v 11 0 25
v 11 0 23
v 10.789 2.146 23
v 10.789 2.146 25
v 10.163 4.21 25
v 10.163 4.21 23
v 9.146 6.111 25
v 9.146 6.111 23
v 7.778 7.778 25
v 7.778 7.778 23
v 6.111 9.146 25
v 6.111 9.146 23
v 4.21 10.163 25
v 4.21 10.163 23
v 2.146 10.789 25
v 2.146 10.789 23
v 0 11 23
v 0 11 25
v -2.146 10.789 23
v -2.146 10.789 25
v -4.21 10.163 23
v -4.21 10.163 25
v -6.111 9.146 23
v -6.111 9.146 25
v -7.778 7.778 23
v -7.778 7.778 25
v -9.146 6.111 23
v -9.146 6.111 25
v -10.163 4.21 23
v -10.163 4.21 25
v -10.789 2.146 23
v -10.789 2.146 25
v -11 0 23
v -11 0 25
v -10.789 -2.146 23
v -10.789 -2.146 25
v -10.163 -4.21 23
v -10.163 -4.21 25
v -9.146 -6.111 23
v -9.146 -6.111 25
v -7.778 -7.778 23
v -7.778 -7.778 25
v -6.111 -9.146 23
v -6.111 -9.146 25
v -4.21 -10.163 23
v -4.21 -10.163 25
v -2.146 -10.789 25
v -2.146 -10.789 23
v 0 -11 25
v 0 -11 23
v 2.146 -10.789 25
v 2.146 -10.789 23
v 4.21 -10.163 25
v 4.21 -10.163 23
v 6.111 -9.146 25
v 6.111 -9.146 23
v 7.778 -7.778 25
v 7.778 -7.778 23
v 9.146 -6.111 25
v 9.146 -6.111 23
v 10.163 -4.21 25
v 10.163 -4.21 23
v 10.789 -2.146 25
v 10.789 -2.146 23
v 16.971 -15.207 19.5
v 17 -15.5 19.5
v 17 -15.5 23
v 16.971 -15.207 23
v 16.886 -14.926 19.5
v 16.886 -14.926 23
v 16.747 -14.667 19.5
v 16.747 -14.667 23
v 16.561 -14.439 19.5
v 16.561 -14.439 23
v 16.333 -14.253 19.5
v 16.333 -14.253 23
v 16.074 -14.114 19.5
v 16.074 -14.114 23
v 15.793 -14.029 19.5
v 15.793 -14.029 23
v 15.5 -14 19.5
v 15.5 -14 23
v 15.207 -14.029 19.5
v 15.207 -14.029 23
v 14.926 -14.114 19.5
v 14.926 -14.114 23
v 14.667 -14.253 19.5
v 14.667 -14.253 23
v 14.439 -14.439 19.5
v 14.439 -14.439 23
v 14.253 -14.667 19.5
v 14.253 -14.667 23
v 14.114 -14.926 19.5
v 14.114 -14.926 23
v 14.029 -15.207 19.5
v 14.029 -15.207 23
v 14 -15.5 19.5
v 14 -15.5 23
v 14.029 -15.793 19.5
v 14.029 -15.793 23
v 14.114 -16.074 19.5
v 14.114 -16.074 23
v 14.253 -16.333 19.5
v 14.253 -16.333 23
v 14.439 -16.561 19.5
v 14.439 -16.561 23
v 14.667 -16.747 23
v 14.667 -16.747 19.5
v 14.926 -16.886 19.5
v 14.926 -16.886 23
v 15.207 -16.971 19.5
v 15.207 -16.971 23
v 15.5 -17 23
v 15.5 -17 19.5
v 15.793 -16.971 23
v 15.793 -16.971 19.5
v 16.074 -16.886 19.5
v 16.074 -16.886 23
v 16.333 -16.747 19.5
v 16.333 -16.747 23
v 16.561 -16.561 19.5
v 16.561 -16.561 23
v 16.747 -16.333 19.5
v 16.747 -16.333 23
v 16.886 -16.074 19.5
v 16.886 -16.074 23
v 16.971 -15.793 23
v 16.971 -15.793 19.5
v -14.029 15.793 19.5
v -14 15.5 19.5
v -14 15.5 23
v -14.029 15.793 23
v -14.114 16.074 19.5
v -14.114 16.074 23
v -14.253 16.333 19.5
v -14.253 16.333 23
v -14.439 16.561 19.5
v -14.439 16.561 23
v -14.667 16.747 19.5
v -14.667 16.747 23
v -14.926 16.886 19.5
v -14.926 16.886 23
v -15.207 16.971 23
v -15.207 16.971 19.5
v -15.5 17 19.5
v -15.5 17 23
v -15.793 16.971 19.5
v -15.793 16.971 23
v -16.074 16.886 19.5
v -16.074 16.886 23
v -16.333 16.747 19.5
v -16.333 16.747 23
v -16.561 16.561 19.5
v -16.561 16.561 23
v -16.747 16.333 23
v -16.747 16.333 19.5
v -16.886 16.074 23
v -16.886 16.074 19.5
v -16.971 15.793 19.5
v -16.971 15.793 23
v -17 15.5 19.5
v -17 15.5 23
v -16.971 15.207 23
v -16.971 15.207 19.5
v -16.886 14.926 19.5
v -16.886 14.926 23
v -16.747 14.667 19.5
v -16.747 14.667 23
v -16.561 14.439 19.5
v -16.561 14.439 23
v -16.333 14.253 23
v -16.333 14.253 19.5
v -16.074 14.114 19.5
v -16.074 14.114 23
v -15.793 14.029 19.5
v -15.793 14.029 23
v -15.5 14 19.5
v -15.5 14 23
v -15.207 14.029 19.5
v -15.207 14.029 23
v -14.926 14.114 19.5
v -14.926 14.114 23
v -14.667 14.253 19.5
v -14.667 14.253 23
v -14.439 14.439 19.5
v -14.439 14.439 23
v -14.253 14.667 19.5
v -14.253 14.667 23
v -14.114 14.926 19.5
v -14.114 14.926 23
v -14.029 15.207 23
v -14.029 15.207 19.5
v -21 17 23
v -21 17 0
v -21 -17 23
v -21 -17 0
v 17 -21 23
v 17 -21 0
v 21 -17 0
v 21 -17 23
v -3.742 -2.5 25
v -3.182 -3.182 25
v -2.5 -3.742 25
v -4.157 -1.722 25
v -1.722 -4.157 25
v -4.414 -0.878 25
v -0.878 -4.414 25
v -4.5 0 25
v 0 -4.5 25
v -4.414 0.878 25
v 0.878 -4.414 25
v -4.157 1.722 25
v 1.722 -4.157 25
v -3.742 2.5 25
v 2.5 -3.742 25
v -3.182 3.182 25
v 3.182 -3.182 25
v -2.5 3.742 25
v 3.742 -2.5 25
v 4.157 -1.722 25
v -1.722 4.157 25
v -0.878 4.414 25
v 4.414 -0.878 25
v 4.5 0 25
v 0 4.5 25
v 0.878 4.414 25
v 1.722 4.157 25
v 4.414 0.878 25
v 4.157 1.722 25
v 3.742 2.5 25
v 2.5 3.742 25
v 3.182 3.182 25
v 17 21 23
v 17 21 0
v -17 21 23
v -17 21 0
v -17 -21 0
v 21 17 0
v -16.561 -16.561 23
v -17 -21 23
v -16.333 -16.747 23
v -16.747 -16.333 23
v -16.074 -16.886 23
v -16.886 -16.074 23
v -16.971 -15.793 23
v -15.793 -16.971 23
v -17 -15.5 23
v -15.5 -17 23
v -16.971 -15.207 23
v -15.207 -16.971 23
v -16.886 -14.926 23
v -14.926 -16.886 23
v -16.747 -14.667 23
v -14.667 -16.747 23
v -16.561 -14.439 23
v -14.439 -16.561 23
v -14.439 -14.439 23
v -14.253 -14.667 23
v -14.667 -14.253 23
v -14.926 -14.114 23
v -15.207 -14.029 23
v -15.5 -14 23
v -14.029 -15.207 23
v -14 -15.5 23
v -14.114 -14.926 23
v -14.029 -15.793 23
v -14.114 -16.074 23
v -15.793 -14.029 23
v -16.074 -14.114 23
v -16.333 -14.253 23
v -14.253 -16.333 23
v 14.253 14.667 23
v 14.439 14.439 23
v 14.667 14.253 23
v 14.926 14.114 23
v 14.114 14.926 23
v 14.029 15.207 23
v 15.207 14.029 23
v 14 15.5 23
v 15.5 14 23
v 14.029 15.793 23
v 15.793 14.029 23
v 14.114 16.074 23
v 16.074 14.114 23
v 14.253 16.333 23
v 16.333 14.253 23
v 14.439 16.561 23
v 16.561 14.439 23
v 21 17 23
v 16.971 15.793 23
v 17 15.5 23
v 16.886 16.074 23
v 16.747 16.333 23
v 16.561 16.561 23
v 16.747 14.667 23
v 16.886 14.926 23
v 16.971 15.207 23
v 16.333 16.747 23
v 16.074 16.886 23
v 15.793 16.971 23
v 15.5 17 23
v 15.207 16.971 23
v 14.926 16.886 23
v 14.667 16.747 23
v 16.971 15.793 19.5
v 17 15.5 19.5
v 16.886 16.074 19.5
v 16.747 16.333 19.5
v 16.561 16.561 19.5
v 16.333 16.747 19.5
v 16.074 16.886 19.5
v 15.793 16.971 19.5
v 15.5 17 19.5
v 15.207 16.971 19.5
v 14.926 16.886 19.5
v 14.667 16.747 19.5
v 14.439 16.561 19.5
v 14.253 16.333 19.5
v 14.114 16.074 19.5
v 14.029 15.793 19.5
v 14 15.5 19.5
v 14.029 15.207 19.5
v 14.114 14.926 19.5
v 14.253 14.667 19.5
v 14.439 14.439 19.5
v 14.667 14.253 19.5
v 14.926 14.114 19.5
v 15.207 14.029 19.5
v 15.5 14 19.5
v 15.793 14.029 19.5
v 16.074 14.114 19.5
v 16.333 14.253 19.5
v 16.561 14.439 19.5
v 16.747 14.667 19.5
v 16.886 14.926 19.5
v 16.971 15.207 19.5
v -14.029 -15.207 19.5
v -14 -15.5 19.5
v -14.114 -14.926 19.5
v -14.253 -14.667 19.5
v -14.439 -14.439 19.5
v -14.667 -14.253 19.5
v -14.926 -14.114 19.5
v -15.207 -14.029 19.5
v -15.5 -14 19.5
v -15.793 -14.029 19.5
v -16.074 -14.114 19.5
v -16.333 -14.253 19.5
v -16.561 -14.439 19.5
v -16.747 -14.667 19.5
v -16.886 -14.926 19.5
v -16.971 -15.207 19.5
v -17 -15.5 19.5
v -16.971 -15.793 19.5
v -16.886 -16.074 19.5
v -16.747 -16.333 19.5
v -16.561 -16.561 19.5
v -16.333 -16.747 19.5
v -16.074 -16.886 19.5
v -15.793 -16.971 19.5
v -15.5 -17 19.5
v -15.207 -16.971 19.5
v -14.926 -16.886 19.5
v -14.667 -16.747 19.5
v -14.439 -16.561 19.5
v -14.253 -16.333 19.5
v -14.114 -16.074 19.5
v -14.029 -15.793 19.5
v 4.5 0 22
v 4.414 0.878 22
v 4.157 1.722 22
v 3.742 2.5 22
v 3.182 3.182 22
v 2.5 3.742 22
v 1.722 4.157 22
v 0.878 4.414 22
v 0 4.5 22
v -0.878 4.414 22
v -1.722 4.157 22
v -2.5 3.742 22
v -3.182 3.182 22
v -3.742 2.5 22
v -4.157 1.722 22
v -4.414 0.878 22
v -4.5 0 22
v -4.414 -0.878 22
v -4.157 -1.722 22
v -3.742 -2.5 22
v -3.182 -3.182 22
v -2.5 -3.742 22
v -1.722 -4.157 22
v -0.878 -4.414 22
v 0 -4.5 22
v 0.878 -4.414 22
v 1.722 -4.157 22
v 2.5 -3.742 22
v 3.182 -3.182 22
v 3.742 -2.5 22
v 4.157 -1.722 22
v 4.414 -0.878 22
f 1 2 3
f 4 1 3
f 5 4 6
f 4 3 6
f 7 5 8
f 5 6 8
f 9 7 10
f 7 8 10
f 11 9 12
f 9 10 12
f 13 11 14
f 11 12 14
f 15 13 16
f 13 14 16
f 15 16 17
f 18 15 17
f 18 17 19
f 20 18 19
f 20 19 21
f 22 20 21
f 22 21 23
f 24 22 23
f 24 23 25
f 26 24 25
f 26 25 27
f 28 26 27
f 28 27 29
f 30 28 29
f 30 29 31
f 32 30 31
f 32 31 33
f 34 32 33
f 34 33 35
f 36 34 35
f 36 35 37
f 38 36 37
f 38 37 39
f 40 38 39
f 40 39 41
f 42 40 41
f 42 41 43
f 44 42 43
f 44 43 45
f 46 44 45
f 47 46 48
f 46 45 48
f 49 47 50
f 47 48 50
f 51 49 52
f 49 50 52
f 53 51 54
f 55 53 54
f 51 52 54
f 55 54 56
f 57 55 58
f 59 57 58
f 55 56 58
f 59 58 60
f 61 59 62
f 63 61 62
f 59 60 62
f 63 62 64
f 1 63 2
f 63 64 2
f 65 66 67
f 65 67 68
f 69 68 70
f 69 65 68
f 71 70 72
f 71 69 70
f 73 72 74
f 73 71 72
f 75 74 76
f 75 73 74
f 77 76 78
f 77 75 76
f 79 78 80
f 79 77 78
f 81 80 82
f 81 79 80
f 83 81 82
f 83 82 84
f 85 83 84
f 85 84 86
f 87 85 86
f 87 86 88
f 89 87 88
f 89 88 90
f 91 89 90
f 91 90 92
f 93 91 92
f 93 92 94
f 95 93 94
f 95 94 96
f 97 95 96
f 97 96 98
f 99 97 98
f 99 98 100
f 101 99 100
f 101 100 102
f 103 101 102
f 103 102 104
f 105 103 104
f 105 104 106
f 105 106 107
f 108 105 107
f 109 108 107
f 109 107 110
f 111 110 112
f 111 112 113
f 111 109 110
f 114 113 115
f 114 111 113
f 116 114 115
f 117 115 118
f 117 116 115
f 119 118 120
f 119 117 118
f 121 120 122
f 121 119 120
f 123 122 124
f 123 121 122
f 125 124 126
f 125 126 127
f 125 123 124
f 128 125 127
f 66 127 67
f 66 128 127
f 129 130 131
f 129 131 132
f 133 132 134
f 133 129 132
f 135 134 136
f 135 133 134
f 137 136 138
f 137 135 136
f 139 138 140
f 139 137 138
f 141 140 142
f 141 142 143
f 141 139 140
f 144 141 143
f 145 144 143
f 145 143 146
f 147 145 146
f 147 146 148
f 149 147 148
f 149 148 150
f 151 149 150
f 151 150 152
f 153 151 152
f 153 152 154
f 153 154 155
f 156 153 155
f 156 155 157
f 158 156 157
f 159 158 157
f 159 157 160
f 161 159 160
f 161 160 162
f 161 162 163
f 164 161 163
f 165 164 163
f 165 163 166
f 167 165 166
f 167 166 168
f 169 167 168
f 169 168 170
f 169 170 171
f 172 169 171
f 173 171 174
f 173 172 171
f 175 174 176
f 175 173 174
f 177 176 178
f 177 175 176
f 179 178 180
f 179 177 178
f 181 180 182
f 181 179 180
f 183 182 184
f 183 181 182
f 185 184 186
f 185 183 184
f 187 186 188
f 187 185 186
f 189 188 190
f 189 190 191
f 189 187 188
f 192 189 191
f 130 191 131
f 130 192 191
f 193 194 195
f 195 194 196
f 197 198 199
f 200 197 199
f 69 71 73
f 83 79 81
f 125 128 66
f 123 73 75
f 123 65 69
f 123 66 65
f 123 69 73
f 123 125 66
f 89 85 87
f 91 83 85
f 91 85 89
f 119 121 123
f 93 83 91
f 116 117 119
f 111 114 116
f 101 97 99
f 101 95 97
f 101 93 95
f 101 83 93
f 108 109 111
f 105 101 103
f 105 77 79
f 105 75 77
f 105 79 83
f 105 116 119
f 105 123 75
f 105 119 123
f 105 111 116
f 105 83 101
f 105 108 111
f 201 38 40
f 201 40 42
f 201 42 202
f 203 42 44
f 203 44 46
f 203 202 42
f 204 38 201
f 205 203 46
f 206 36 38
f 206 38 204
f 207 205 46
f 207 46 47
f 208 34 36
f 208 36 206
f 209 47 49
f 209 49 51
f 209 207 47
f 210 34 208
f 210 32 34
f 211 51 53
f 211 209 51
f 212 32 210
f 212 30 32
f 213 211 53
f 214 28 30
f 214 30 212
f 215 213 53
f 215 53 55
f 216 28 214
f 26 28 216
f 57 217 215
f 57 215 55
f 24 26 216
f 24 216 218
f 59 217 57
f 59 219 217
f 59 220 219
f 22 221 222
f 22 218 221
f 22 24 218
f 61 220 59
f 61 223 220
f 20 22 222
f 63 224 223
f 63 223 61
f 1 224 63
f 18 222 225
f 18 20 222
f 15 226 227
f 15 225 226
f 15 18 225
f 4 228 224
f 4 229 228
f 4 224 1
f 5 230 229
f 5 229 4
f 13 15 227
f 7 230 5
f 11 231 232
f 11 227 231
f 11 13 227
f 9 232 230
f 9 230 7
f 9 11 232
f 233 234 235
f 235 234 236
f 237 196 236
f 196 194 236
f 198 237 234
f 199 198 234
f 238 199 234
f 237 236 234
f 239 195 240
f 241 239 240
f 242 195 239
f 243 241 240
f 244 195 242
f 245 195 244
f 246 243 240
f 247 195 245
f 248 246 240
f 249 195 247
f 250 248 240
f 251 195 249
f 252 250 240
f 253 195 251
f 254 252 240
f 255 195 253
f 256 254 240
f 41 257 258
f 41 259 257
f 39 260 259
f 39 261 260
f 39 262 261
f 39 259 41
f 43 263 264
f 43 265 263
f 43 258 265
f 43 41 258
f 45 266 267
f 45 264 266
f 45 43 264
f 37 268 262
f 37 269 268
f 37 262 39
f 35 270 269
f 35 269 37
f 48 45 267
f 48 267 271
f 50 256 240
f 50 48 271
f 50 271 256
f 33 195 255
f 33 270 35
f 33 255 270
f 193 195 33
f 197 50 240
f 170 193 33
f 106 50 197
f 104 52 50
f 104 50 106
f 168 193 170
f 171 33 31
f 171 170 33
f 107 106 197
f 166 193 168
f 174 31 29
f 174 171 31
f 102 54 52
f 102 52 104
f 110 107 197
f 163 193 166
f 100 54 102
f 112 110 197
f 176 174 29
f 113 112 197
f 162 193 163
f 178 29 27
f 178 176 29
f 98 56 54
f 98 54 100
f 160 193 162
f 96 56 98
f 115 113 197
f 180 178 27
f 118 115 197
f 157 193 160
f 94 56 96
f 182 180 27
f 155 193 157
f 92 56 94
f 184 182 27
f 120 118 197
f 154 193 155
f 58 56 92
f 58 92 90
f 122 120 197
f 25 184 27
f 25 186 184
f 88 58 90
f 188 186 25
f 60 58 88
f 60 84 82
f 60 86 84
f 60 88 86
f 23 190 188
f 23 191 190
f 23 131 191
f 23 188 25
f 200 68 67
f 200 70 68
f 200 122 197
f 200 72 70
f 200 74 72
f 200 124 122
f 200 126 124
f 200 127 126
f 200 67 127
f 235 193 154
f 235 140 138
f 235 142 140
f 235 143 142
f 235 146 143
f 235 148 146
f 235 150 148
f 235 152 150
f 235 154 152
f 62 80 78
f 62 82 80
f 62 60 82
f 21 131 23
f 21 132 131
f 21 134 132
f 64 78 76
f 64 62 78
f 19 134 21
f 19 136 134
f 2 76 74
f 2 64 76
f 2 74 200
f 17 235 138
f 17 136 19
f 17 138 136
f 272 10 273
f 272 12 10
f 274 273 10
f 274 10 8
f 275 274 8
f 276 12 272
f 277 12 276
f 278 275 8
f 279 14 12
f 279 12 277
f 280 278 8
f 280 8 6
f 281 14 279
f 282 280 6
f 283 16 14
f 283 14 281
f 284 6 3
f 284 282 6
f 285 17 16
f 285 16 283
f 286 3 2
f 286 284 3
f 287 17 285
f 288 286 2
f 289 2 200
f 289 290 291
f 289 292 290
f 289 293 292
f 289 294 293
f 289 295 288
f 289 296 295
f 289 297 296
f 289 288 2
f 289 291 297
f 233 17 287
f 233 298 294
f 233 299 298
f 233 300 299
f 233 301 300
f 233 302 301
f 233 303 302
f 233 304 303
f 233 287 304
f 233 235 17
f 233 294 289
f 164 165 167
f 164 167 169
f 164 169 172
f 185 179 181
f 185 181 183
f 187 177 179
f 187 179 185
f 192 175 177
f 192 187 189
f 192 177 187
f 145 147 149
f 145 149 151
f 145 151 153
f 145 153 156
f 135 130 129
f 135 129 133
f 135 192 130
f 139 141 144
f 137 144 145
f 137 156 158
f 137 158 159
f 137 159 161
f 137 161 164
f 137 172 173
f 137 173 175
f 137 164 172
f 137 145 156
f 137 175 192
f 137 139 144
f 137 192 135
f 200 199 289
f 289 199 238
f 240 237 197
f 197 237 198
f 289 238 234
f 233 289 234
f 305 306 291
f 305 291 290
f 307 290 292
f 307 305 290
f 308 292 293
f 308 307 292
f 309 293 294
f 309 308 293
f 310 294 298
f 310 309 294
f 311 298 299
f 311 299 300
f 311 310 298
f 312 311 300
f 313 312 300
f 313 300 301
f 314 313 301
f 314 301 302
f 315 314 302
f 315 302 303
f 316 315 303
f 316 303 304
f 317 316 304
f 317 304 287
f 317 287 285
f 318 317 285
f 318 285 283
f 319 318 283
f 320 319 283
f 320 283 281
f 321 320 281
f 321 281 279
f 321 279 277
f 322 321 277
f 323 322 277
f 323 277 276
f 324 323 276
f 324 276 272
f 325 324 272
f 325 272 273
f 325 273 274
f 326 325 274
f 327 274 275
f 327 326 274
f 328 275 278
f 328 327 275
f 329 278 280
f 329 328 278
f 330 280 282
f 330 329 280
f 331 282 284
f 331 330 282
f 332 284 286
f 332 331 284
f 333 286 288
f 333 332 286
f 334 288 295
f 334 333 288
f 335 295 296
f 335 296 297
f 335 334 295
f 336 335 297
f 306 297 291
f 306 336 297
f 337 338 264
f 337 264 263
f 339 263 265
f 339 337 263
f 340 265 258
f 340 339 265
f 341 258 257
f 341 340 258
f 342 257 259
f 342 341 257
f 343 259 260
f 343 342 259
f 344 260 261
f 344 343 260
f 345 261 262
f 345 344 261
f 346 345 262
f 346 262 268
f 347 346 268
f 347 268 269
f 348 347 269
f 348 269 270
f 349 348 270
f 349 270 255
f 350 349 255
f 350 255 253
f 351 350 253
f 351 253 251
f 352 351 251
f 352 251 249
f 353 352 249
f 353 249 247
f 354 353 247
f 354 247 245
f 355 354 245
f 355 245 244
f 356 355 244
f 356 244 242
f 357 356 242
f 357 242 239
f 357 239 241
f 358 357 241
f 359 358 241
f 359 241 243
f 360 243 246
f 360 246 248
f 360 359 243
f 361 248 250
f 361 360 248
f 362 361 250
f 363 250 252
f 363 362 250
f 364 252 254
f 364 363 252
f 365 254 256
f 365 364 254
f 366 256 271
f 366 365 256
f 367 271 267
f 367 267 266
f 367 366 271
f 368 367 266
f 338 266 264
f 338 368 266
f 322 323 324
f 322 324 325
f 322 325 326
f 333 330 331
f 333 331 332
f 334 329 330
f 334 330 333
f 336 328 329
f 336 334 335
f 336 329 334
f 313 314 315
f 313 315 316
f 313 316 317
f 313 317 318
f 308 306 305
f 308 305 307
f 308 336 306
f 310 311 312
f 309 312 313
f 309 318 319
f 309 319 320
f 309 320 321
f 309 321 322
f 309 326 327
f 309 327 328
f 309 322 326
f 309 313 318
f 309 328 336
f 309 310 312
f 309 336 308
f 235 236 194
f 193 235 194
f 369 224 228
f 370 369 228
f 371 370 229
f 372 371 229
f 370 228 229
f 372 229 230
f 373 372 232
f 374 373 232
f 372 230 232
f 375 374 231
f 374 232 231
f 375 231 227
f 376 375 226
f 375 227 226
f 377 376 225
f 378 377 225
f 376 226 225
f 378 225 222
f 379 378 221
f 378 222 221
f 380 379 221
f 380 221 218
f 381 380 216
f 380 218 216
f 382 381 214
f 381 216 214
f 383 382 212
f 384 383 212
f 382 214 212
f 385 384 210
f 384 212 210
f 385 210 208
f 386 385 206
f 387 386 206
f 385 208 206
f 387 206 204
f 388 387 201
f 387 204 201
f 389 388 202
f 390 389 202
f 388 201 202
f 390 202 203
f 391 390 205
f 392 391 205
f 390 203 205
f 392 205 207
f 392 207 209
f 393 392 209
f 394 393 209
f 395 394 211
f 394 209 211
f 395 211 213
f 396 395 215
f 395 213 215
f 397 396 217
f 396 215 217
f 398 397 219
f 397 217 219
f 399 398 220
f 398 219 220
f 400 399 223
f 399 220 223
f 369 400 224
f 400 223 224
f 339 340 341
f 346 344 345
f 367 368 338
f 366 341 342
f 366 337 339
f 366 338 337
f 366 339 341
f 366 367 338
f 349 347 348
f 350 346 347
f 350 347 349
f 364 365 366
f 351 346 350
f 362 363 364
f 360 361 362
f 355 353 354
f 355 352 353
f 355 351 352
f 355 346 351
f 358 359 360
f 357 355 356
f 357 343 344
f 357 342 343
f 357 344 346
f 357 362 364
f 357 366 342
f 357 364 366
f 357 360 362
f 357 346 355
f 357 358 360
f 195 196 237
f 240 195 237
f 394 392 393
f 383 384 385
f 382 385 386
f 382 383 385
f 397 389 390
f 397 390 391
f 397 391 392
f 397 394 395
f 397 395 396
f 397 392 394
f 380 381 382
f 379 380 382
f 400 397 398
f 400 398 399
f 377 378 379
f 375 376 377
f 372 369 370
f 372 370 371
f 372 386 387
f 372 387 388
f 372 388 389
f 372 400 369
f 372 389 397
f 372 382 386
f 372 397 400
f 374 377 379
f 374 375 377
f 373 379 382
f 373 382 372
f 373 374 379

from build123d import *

# Parameters (mm, degrees)
SKETCH_1_R          = 1.5
EXTRUDE_1_DEPTH     = 23
SKETCH_1_3_R        = 1.5
EXTRUDE_2_DEPTH     = 19.5
SKETCH_1_6_R        = 11
EXTRUDE_4_DEPTH     = 25
SKETCH_2_R          = 4.5
CUT_EXTRUDE_1_DEPTH = 3


with BuildPart() as part:
    # 草图1 → 凸台-拉伸1 (new body)
    with BuildSketch(Plane.XY):
        Polygon((-21, -17), (-17, -21), (17, -21), (21, -17), (21, 17), (17, 21), (-17, 21), (-21, 17), align=None)
        with Locations((-15.5, -15.5)):
            Circle(SKETCH_1_R, mode=Mode.SUBTRACT)
        with Locations((15.5, -15.5)):
            Circle(SKETCH_1_R, mode=Mode.SUBTRACT)
        with Locations((-15.5, 15.5)):
            Circle(SKETCH_1_R, mode=Mode.SUBTRACT)
        with Locations((15.5, 15.5)):
            Circle(SKETCH_1_R, mode=Mode.SUBTRACT)
    extrude(amount=EXTRUDE_1_DEPTH)

    # 草图1<3> → 凸台-拉伸2 (add)
    with BuildSketch(Plane.XY):
        with Locations((-15.5, 15.5)):
            Circle(SKETCH_1_3_R)
        with Locations((15.5, 15.5)):
            Circle(SKETCH_1_3_R)
        with Locations((-15.5, -15.5)):
            Circle(SKETCH_1_3_R)
        with Locations((15.5, -15.5)):
            Circle(SKETCH_1_3_R)
    extrude(amount=EXTRUDE_2_DEPTH)

    # 草图1<6> → 凸台-拉伸4 (add)
    with BuildSketch(Plane.XY):
        Circle(SKETCH_1_6_R)
    extrude(amount=EXTRUDE_4_DEPTH)

    # 草图2 → 切除-拉伸1 (cut)
    with BuildSketch(Plane.XY.offset(25)):
        Circle(SKETCH_2_R)
    extrude(amount=-CUT_EXTRUDE_1_DEPTH, mode=Mode.SUBTRACT)


solid = part.part
